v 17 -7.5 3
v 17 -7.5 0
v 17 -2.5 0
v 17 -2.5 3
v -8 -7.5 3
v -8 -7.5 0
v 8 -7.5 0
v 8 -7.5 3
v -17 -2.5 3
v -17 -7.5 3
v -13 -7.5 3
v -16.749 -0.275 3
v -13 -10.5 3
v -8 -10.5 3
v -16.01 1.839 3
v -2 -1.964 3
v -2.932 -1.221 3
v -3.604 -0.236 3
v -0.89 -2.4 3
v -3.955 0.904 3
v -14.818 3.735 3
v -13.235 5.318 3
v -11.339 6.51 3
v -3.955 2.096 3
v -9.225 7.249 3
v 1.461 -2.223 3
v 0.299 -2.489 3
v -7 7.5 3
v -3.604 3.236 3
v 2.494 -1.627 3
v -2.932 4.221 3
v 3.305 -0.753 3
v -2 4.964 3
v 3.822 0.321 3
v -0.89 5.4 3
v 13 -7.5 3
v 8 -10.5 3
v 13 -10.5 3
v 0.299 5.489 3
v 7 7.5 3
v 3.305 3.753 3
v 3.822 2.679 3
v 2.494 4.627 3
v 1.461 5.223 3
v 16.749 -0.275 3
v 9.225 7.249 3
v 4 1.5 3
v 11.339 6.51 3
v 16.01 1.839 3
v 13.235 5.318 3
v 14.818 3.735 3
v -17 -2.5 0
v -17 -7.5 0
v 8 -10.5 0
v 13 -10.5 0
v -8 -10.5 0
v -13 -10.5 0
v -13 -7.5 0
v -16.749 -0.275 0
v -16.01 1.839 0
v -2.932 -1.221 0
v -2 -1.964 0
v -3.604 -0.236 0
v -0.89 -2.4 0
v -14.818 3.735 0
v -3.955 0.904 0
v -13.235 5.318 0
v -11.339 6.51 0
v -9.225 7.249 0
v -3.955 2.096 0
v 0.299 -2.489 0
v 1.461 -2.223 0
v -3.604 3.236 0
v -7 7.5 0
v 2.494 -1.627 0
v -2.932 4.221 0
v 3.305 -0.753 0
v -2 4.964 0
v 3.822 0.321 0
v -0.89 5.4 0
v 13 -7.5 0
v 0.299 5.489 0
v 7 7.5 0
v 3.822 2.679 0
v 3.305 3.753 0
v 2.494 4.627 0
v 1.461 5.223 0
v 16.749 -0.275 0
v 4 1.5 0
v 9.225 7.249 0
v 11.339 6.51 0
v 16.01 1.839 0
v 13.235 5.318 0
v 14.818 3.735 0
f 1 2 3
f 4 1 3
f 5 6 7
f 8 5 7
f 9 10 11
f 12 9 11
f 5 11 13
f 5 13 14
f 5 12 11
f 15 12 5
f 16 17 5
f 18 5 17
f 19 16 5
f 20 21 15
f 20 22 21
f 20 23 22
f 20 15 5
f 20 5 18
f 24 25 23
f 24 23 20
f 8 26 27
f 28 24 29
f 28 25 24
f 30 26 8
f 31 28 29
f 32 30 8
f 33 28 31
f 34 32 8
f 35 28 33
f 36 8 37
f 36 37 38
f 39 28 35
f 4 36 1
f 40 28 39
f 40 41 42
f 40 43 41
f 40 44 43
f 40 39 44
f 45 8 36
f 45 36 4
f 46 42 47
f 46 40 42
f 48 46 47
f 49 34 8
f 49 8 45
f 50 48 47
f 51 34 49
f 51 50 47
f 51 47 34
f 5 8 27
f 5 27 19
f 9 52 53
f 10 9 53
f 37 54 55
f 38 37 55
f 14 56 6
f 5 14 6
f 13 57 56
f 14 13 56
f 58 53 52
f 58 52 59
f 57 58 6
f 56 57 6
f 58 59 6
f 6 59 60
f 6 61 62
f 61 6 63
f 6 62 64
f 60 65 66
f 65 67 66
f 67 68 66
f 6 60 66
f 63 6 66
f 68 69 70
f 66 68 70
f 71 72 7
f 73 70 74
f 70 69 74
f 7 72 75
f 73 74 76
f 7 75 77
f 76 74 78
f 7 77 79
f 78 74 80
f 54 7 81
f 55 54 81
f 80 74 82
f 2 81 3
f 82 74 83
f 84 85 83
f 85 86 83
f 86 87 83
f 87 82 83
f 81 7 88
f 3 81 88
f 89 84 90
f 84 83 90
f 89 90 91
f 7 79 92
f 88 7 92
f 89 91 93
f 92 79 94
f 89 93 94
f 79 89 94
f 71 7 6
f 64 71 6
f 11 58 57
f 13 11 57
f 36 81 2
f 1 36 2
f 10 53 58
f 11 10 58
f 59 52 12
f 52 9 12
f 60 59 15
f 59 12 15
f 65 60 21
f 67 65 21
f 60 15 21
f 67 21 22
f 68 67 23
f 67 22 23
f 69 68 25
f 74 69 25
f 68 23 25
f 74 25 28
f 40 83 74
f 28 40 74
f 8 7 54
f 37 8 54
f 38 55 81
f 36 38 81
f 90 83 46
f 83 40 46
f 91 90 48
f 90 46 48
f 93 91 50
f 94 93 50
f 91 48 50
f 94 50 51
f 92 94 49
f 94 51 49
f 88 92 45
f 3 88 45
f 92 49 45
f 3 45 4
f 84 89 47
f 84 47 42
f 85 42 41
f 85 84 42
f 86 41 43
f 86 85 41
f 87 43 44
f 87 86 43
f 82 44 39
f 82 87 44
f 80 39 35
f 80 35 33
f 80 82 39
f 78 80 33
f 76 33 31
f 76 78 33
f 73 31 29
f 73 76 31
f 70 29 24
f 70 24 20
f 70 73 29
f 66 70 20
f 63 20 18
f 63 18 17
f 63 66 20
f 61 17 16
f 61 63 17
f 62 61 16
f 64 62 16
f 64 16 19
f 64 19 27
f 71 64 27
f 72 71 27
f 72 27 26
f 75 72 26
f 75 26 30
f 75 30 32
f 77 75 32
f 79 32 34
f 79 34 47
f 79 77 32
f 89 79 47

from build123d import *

# Parameters (mm, degrees)
SKETCH1_R           = 4
BOSS_EXTRUDE1_DEPTH = 3
FILLET1_R           = 10


with BuildPart() as part:
    # Sketch1 → Boss-Extrude1 (new body)
    with BuildSketch(Plane.XY):
        Polygon((-17, -7.5), (-13, -7.5), (-13, -10.5), (-8, -10.5), (-8, -7.5), (8, -7.5), (8, -10.5), (13, -10.5), (13, -7.5), (17, -7.5), (17, 7.5), (-17, 7.5), align=None)
        with Locations((0, 1.5)):
            Circle(SKETCH1_R, mode=Mode.SUBTRACT)
    extrude(amount=BOSS_EXTRUDE1_DEPTH)

    # Fillet1
    fillet1_edges = [part.edges().sort_by_distance(p)[0] for p in [
        (-17, 7.5, 1.5),
        (17, 7.5, 1.5),
    ]]
    fillet(fillet1_edges, radius=FILLET1_R)


solid = part.part
